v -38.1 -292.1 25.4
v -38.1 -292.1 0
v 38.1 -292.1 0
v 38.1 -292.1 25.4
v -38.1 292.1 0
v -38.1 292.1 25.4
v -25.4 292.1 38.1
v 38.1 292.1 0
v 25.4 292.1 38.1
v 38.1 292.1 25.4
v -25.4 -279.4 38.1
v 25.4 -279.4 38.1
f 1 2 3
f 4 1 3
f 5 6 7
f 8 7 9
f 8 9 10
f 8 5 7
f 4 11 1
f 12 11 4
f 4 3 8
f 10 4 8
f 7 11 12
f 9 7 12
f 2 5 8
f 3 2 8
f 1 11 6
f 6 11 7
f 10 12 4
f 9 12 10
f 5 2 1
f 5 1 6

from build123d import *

# Parameters (mm, degrees)
F0_W     = 76.2
F0_H     = 584.2
F1_DEPTH = 38.1
F2_SIZE  = 12.7


with BuildPart() as f1:
    # F0 (on Top) → F1 (new body)
    with BuildSketch(Plane.XY):
        Rectangle(F0_W, F0_H)
    extrude(amount=F1_DEPTH)

    # F2
    f2_edges = [f1.edges().sort_by_distance(p)[0] for p in [
        (0, -292.1, 38.1),
        (38.1, 0, 38.1),
        (-38.1, 0, 38.1),
    ]]
    chamfer(f2_edges, length=F2_SIZE)


solid = f1.part
